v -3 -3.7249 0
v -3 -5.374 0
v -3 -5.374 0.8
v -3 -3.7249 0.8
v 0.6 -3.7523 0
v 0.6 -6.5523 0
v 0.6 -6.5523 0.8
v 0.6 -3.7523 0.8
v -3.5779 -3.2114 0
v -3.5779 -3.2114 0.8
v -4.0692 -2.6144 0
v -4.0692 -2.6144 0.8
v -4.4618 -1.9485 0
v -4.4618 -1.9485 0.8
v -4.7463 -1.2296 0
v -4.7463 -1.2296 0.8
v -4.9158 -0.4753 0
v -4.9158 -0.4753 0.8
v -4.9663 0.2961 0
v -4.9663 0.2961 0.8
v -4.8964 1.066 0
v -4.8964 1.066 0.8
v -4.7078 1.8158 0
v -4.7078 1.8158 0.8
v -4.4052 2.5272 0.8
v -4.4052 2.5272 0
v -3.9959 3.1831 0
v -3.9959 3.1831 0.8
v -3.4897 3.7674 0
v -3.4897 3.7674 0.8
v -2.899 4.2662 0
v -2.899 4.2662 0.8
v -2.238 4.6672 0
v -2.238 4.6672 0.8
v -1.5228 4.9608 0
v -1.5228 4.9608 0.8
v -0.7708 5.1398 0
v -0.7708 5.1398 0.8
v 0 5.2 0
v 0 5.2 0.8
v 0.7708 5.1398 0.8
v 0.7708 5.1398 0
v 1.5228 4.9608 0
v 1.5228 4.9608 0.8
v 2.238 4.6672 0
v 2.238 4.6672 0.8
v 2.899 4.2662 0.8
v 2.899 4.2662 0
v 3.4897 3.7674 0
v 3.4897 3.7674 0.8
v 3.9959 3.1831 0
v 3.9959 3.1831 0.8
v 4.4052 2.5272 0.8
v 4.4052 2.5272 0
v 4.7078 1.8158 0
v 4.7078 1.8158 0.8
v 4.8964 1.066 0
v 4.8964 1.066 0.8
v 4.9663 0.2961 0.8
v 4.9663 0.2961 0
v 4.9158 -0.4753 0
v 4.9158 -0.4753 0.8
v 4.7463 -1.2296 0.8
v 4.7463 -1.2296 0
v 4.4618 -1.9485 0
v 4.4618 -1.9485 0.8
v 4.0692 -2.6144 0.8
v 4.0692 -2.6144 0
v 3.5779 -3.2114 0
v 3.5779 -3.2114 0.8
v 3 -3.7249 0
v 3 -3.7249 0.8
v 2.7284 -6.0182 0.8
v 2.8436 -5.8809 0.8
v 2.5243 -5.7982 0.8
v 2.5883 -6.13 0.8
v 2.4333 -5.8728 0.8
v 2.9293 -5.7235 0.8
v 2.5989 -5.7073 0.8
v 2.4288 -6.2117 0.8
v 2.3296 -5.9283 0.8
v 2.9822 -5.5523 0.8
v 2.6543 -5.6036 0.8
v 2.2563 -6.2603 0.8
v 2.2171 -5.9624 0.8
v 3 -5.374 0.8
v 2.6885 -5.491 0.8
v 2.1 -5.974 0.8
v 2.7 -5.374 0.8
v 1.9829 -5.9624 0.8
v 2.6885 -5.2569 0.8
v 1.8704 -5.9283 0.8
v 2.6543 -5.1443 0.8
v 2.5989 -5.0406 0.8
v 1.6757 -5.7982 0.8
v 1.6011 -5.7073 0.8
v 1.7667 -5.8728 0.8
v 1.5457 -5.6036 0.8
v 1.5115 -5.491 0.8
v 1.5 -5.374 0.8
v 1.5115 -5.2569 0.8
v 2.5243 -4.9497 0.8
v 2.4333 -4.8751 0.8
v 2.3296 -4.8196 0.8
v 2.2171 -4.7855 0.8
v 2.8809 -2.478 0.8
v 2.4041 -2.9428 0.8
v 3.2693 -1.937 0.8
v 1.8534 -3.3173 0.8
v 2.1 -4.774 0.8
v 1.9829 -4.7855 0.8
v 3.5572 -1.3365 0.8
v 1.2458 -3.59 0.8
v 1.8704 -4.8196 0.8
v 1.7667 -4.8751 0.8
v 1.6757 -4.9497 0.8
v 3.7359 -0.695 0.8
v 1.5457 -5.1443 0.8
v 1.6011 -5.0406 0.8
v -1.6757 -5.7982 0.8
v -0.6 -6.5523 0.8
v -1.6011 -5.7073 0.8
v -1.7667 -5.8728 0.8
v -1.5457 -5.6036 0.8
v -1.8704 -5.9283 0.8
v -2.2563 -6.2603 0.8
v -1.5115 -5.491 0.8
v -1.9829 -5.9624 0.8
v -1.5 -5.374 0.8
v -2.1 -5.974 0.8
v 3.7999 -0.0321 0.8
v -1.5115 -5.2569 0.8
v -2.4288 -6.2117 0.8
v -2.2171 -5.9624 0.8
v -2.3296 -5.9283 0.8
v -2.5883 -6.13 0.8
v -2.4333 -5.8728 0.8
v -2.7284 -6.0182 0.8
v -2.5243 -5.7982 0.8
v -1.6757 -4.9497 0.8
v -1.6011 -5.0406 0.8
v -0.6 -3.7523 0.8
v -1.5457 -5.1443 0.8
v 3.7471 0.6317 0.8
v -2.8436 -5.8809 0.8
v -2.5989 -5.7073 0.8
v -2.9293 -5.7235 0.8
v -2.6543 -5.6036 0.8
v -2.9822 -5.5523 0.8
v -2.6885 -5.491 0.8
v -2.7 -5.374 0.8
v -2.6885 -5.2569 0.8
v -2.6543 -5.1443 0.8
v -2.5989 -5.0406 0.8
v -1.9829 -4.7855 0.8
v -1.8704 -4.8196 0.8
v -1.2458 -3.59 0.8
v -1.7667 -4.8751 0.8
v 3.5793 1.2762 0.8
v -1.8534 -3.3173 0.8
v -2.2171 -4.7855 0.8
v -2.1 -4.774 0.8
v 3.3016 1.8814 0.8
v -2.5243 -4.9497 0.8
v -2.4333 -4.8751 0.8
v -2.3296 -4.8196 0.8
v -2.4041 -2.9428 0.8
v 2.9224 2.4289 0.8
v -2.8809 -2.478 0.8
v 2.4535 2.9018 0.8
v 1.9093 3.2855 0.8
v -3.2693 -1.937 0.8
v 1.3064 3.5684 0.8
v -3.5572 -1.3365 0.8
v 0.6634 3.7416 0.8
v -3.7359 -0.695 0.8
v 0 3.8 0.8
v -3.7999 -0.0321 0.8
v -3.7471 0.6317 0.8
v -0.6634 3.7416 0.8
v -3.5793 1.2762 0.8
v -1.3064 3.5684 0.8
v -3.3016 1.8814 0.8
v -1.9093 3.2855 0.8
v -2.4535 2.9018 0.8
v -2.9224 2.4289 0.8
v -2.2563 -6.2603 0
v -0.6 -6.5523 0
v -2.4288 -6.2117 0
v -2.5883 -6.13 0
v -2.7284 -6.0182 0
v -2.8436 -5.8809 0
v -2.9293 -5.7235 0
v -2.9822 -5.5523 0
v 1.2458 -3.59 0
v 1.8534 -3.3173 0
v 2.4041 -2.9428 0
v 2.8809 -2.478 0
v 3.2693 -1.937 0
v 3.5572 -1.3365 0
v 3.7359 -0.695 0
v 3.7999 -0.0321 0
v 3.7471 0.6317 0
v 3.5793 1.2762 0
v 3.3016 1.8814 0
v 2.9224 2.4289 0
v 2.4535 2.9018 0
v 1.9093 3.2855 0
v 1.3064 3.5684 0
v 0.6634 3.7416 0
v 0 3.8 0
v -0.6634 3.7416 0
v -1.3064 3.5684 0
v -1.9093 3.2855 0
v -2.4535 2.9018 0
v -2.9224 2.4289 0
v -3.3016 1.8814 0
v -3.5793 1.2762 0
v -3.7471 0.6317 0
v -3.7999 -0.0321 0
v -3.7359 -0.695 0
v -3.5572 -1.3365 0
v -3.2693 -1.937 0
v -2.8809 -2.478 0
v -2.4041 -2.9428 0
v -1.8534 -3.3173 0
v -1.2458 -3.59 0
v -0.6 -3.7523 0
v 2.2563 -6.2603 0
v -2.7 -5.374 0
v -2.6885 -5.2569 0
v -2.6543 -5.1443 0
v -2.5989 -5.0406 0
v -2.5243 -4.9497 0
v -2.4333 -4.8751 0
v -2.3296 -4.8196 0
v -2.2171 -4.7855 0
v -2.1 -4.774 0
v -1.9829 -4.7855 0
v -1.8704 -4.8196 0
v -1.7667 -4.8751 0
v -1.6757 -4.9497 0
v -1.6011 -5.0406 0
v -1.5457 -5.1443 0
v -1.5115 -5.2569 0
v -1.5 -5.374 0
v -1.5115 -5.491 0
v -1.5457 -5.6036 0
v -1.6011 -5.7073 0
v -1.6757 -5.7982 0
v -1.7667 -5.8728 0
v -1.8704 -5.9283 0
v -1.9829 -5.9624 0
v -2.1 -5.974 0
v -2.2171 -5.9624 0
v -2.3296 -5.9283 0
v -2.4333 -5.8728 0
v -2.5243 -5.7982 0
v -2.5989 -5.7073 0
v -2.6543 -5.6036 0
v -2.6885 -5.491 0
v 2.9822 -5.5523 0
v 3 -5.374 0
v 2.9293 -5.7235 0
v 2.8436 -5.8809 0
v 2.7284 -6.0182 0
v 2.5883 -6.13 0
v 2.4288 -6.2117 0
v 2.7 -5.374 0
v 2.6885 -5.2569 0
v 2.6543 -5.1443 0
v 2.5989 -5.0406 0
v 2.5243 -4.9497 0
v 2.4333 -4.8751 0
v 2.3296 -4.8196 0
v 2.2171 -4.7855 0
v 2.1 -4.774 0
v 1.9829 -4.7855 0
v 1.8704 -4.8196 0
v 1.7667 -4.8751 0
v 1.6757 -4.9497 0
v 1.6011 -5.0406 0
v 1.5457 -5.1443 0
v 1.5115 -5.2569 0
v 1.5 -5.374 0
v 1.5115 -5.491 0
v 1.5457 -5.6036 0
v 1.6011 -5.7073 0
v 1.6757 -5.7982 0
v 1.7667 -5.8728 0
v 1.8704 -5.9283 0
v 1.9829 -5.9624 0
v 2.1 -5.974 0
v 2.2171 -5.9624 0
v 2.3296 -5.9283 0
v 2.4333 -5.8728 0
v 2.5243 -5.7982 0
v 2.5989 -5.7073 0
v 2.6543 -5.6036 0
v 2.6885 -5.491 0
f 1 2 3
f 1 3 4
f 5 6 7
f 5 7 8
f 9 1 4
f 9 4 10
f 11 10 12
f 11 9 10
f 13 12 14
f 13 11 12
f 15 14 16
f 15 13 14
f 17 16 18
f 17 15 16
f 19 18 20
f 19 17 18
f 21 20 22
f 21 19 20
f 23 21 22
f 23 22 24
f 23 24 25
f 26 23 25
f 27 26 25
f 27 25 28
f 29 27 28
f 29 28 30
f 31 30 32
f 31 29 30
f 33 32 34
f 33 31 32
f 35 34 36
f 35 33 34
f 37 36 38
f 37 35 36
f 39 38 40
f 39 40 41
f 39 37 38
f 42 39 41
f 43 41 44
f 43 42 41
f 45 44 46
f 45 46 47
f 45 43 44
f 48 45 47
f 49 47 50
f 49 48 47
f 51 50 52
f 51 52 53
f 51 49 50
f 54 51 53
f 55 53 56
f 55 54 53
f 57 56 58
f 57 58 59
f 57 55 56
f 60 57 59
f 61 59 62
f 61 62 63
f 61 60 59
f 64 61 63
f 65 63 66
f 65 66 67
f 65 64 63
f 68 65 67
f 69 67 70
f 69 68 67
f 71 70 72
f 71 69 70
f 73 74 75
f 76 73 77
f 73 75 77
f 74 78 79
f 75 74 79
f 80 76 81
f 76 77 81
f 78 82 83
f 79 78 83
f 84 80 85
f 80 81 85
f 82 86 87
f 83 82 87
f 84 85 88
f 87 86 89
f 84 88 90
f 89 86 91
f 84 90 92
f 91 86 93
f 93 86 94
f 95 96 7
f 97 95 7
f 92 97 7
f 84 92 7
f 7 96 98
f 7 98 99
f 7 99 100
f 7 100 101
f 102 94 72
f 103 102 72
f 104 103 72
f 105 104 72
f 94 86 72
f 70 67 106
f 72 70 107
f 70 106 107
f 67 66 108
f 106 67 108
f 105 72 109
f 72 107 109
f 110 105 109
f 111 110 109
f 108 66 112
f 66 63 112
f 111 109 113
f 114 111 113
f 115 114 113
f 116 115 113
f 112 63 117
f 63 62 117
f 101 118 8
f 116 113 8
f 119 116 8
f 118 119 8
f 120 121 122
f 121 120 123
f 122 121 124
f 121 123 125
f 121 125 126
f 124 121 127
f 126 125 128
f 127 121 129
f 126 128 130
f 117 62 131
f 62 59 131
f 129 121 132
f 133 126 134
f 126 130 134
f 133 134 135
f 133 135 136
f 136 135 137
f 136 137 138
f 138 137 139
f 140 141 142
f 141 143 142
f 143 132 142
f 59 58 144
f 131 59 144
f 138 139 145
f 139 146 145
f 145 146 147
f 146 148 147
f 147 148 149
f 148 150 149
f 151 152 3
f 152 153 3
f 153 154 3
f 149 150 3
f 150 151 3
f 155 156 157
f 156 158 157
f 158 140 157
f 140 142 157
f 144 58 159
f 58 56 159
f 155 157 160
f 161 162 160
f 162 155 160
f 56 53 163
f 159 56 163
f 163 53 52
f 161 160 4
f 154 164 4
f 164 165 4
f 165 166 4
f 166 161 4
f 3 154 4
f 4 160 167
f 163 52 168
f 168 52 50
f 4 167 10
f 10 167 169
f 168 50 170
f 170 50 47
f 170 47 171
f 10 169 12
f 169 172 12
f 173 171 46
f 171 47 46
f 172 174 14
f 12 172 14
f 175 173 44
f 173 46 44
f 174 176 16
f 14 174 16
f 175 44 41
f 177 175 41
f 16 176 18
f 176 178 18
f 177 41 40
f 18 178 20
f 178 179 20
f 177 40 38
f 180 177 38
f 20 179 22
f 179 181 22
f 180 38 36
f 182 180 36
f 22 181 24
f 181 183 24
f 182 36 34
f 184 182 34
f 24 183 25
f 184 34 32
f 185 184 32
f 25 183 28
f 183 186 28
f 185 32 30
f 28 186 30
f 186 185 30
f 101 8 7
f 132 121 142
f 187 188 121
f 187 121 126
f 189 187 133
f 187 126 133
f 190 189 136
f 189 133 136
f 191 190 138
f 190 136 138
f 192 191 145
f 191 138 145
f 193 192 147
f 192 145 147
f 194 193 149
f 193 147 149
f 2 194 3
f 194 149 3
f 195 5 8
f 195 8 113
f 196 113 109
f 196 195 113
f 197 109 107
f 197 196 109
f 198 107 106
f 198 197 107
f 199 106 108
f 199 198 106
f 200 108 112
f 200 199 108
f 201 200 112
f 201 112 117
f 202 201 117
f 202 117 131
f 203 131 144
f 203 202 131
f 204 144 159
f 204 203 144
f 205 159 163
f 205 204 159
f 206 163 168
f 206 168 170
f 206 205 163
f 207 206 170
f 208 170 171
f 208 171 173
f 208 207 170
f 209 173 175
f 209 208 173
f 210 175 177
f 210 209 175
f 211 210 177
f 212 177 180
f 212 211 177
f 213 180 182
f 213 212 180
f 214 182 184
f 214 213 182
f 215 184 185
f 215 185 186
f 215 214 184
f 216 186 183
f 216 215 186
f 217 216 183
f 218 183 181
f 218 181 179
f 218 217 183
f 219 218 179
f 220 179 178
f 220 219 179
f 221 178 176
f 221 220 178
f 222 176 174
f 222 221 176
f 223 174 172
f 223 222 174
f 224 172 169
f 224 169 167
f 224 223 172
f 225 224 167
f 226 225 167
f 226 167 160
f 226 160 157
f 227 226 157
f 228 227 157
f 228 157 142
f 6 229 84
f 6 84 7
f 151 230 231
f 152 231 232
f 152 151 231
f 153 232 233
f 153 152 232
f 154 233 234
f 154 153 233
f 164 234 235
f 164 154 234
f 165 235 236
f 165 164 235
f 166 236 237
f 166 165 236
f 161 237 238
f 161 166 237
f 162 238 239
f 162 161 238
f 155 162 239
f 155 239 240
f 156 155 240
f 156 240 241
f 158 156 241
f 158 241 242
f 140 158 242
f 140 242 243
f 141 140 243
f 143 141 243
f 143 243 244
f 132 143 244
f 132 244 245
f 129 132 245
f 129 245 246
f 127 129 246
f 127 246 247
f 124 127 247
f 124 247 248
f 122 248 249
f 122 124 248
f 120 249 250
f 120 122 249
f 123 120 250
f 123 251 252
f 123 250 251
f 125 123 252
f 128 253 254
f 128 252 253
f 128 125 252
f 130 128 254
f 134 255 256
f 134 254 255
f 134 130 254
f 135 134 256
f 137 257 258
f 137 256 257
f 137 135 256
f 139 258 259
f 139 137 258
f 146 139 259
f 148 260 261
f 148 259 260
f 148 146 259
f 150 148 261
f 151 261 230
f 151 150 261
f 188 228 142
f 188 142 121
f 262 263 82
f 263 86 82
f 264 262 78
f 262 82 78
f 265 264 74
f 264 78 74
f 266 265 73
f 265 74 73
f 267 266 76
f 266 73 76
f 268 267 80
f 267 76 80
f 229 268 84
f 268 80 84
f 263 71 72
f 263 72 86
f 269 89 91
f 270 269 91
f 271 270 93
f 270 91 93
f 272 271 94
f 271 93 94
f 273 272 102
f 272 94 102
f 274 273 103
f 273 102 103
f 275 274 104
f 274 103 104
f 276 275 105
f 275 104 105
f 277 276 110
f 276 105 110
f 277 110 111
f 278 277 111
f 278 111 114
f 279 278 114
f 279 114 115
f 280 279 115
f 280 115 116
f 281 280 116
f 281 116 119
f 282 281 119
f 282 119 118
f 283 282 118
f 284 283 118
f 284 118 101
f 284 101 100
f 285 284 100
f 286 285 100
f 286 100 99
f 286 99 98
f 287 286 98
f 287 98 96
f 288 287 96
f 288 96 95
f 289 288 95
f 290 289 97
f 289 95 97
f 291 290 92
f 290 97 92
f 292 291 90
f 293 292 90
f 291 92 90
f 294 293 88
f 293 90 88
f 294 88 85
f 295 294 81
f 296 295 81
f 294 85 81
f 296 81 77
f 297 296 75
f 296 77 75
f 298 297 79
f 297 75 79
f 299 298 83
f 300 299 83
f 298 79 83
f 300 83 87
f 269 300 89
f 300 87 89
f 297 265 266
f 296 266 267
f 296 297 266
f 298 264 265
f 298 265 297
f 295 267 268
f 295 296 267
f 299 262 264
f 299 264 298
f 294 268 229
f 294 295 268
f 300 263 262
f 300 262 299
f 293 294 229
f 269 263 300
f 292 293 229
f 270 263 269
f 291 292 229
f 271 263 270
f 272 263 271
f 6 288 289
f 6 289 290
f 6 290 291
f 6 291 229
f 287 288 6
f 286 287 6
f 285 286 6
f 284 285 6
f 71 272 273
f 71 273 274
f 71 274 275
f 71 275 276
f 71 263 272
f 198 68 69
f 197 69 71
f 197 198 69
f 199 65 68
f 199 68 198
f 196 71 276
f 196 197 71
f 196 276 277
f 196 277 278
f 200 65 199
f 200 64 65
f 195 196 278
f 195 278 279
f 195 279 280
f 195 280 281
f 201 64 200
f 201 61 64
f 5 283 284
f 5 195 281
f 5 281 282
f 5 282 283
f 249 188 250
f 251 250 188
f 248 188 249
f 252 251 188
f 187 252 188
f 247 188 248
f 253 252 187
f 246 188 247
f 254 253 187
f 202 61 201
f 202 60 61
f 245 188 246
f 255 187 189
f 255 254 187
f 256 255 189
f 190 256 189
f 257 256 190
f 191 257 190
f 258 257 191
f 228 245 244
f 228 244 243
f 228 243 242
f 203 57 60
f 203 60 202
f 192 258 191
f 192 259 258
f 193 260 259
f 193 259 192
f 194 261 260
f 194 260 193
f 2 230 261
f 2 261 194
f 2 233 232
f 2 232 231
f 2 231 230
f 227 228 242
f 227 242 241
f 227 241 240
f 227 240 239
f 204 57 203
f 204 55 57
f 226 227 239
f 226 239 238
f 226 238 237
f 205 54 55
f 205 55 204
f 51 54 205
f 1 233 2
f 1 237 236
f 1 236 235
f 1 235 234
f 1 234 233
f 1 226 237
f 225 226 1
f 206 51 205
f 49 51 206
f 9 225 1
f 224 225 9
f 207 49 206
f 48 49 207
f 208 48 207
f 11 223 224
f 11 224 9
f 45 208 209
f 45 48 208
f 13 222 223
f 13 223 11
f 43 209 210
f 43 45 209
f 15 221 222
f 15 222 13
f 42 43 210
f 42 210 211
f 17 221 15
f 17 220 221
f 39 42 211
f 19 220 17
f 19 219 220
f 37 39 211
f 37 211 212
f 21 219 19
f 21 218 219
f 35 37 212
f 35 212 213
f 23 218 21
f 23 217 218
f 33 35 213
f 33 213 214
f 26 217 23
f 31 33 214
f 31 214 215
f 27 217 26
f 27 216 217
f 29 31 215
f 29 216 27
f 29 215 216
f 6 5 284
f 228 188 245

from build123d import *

# Parameters (mm, degrees)
BASE_EXTRUDE_DEPTH = 0.8
FILLET1_R          = 0.9
SKETCH2_R          = 0.6
CUT_EXTRUDE1_DEPTH = 9.260801437


with BuildPart() as part:
    # Sketch1 → Base-Extrude (new body)
    with BuildSketch(Plane.XY):
        with BuildLine():
            Line((-0.6, -3.752332608), (-0.6, -6.552332608))
            Line((-0.6, -6.552332608), (-3, -6.129147854))
            Line((-3, -6.129147854), (-3, -3.724921052))
            ThreePointArc((-3, -3.724921052), (0, 5.2), (3, -3.724921052))
            Line((3, -3.724921052), (3, -6.129147854))
            Line((3, -6.129147854), (0.6, -6.552332608))
            Line((0.6, -6.552332608), (0.6, -3.752332608))
            ThreePointArc((0.6, -3.752332608), (0, 3.8), (-0.6, -3.752332608))
        make_face()
    extrude(amount=BASE_EXTRUDE_DEPTH)

    # Fillet1
    fillet1_edges = [part.edges().sort_by_distance(p)[0] for p in [
        (3, -6.129147854, 0.4),
        (-3, -6.129147854, 0.4),
    ]]
    fillet(fillet1_edges, radius=FILLET1_R)

    # Sketch2 → Cut-Extrude1 (cut, through all)
    with BuildSketch(Plane.XY.offset(0.8)):
        with Locations((2.1, -5.373958186)):
            Circle(SKETCH2_R)
    cut_extrude1 = extrude(amount=-CUT_EXTRUDE1_DEPTH, mode=Mode.SUBTRACT)

    # Mirror1: Cut-Extrude1 across plane
    add(cut_extrude1.mirror(Plane(origin=(0, 0, 0), x_dir=(0, 0, 1), z_dir=(1, 0, 0))), mode=Mode.SUBTRACT)


solid = part.part
